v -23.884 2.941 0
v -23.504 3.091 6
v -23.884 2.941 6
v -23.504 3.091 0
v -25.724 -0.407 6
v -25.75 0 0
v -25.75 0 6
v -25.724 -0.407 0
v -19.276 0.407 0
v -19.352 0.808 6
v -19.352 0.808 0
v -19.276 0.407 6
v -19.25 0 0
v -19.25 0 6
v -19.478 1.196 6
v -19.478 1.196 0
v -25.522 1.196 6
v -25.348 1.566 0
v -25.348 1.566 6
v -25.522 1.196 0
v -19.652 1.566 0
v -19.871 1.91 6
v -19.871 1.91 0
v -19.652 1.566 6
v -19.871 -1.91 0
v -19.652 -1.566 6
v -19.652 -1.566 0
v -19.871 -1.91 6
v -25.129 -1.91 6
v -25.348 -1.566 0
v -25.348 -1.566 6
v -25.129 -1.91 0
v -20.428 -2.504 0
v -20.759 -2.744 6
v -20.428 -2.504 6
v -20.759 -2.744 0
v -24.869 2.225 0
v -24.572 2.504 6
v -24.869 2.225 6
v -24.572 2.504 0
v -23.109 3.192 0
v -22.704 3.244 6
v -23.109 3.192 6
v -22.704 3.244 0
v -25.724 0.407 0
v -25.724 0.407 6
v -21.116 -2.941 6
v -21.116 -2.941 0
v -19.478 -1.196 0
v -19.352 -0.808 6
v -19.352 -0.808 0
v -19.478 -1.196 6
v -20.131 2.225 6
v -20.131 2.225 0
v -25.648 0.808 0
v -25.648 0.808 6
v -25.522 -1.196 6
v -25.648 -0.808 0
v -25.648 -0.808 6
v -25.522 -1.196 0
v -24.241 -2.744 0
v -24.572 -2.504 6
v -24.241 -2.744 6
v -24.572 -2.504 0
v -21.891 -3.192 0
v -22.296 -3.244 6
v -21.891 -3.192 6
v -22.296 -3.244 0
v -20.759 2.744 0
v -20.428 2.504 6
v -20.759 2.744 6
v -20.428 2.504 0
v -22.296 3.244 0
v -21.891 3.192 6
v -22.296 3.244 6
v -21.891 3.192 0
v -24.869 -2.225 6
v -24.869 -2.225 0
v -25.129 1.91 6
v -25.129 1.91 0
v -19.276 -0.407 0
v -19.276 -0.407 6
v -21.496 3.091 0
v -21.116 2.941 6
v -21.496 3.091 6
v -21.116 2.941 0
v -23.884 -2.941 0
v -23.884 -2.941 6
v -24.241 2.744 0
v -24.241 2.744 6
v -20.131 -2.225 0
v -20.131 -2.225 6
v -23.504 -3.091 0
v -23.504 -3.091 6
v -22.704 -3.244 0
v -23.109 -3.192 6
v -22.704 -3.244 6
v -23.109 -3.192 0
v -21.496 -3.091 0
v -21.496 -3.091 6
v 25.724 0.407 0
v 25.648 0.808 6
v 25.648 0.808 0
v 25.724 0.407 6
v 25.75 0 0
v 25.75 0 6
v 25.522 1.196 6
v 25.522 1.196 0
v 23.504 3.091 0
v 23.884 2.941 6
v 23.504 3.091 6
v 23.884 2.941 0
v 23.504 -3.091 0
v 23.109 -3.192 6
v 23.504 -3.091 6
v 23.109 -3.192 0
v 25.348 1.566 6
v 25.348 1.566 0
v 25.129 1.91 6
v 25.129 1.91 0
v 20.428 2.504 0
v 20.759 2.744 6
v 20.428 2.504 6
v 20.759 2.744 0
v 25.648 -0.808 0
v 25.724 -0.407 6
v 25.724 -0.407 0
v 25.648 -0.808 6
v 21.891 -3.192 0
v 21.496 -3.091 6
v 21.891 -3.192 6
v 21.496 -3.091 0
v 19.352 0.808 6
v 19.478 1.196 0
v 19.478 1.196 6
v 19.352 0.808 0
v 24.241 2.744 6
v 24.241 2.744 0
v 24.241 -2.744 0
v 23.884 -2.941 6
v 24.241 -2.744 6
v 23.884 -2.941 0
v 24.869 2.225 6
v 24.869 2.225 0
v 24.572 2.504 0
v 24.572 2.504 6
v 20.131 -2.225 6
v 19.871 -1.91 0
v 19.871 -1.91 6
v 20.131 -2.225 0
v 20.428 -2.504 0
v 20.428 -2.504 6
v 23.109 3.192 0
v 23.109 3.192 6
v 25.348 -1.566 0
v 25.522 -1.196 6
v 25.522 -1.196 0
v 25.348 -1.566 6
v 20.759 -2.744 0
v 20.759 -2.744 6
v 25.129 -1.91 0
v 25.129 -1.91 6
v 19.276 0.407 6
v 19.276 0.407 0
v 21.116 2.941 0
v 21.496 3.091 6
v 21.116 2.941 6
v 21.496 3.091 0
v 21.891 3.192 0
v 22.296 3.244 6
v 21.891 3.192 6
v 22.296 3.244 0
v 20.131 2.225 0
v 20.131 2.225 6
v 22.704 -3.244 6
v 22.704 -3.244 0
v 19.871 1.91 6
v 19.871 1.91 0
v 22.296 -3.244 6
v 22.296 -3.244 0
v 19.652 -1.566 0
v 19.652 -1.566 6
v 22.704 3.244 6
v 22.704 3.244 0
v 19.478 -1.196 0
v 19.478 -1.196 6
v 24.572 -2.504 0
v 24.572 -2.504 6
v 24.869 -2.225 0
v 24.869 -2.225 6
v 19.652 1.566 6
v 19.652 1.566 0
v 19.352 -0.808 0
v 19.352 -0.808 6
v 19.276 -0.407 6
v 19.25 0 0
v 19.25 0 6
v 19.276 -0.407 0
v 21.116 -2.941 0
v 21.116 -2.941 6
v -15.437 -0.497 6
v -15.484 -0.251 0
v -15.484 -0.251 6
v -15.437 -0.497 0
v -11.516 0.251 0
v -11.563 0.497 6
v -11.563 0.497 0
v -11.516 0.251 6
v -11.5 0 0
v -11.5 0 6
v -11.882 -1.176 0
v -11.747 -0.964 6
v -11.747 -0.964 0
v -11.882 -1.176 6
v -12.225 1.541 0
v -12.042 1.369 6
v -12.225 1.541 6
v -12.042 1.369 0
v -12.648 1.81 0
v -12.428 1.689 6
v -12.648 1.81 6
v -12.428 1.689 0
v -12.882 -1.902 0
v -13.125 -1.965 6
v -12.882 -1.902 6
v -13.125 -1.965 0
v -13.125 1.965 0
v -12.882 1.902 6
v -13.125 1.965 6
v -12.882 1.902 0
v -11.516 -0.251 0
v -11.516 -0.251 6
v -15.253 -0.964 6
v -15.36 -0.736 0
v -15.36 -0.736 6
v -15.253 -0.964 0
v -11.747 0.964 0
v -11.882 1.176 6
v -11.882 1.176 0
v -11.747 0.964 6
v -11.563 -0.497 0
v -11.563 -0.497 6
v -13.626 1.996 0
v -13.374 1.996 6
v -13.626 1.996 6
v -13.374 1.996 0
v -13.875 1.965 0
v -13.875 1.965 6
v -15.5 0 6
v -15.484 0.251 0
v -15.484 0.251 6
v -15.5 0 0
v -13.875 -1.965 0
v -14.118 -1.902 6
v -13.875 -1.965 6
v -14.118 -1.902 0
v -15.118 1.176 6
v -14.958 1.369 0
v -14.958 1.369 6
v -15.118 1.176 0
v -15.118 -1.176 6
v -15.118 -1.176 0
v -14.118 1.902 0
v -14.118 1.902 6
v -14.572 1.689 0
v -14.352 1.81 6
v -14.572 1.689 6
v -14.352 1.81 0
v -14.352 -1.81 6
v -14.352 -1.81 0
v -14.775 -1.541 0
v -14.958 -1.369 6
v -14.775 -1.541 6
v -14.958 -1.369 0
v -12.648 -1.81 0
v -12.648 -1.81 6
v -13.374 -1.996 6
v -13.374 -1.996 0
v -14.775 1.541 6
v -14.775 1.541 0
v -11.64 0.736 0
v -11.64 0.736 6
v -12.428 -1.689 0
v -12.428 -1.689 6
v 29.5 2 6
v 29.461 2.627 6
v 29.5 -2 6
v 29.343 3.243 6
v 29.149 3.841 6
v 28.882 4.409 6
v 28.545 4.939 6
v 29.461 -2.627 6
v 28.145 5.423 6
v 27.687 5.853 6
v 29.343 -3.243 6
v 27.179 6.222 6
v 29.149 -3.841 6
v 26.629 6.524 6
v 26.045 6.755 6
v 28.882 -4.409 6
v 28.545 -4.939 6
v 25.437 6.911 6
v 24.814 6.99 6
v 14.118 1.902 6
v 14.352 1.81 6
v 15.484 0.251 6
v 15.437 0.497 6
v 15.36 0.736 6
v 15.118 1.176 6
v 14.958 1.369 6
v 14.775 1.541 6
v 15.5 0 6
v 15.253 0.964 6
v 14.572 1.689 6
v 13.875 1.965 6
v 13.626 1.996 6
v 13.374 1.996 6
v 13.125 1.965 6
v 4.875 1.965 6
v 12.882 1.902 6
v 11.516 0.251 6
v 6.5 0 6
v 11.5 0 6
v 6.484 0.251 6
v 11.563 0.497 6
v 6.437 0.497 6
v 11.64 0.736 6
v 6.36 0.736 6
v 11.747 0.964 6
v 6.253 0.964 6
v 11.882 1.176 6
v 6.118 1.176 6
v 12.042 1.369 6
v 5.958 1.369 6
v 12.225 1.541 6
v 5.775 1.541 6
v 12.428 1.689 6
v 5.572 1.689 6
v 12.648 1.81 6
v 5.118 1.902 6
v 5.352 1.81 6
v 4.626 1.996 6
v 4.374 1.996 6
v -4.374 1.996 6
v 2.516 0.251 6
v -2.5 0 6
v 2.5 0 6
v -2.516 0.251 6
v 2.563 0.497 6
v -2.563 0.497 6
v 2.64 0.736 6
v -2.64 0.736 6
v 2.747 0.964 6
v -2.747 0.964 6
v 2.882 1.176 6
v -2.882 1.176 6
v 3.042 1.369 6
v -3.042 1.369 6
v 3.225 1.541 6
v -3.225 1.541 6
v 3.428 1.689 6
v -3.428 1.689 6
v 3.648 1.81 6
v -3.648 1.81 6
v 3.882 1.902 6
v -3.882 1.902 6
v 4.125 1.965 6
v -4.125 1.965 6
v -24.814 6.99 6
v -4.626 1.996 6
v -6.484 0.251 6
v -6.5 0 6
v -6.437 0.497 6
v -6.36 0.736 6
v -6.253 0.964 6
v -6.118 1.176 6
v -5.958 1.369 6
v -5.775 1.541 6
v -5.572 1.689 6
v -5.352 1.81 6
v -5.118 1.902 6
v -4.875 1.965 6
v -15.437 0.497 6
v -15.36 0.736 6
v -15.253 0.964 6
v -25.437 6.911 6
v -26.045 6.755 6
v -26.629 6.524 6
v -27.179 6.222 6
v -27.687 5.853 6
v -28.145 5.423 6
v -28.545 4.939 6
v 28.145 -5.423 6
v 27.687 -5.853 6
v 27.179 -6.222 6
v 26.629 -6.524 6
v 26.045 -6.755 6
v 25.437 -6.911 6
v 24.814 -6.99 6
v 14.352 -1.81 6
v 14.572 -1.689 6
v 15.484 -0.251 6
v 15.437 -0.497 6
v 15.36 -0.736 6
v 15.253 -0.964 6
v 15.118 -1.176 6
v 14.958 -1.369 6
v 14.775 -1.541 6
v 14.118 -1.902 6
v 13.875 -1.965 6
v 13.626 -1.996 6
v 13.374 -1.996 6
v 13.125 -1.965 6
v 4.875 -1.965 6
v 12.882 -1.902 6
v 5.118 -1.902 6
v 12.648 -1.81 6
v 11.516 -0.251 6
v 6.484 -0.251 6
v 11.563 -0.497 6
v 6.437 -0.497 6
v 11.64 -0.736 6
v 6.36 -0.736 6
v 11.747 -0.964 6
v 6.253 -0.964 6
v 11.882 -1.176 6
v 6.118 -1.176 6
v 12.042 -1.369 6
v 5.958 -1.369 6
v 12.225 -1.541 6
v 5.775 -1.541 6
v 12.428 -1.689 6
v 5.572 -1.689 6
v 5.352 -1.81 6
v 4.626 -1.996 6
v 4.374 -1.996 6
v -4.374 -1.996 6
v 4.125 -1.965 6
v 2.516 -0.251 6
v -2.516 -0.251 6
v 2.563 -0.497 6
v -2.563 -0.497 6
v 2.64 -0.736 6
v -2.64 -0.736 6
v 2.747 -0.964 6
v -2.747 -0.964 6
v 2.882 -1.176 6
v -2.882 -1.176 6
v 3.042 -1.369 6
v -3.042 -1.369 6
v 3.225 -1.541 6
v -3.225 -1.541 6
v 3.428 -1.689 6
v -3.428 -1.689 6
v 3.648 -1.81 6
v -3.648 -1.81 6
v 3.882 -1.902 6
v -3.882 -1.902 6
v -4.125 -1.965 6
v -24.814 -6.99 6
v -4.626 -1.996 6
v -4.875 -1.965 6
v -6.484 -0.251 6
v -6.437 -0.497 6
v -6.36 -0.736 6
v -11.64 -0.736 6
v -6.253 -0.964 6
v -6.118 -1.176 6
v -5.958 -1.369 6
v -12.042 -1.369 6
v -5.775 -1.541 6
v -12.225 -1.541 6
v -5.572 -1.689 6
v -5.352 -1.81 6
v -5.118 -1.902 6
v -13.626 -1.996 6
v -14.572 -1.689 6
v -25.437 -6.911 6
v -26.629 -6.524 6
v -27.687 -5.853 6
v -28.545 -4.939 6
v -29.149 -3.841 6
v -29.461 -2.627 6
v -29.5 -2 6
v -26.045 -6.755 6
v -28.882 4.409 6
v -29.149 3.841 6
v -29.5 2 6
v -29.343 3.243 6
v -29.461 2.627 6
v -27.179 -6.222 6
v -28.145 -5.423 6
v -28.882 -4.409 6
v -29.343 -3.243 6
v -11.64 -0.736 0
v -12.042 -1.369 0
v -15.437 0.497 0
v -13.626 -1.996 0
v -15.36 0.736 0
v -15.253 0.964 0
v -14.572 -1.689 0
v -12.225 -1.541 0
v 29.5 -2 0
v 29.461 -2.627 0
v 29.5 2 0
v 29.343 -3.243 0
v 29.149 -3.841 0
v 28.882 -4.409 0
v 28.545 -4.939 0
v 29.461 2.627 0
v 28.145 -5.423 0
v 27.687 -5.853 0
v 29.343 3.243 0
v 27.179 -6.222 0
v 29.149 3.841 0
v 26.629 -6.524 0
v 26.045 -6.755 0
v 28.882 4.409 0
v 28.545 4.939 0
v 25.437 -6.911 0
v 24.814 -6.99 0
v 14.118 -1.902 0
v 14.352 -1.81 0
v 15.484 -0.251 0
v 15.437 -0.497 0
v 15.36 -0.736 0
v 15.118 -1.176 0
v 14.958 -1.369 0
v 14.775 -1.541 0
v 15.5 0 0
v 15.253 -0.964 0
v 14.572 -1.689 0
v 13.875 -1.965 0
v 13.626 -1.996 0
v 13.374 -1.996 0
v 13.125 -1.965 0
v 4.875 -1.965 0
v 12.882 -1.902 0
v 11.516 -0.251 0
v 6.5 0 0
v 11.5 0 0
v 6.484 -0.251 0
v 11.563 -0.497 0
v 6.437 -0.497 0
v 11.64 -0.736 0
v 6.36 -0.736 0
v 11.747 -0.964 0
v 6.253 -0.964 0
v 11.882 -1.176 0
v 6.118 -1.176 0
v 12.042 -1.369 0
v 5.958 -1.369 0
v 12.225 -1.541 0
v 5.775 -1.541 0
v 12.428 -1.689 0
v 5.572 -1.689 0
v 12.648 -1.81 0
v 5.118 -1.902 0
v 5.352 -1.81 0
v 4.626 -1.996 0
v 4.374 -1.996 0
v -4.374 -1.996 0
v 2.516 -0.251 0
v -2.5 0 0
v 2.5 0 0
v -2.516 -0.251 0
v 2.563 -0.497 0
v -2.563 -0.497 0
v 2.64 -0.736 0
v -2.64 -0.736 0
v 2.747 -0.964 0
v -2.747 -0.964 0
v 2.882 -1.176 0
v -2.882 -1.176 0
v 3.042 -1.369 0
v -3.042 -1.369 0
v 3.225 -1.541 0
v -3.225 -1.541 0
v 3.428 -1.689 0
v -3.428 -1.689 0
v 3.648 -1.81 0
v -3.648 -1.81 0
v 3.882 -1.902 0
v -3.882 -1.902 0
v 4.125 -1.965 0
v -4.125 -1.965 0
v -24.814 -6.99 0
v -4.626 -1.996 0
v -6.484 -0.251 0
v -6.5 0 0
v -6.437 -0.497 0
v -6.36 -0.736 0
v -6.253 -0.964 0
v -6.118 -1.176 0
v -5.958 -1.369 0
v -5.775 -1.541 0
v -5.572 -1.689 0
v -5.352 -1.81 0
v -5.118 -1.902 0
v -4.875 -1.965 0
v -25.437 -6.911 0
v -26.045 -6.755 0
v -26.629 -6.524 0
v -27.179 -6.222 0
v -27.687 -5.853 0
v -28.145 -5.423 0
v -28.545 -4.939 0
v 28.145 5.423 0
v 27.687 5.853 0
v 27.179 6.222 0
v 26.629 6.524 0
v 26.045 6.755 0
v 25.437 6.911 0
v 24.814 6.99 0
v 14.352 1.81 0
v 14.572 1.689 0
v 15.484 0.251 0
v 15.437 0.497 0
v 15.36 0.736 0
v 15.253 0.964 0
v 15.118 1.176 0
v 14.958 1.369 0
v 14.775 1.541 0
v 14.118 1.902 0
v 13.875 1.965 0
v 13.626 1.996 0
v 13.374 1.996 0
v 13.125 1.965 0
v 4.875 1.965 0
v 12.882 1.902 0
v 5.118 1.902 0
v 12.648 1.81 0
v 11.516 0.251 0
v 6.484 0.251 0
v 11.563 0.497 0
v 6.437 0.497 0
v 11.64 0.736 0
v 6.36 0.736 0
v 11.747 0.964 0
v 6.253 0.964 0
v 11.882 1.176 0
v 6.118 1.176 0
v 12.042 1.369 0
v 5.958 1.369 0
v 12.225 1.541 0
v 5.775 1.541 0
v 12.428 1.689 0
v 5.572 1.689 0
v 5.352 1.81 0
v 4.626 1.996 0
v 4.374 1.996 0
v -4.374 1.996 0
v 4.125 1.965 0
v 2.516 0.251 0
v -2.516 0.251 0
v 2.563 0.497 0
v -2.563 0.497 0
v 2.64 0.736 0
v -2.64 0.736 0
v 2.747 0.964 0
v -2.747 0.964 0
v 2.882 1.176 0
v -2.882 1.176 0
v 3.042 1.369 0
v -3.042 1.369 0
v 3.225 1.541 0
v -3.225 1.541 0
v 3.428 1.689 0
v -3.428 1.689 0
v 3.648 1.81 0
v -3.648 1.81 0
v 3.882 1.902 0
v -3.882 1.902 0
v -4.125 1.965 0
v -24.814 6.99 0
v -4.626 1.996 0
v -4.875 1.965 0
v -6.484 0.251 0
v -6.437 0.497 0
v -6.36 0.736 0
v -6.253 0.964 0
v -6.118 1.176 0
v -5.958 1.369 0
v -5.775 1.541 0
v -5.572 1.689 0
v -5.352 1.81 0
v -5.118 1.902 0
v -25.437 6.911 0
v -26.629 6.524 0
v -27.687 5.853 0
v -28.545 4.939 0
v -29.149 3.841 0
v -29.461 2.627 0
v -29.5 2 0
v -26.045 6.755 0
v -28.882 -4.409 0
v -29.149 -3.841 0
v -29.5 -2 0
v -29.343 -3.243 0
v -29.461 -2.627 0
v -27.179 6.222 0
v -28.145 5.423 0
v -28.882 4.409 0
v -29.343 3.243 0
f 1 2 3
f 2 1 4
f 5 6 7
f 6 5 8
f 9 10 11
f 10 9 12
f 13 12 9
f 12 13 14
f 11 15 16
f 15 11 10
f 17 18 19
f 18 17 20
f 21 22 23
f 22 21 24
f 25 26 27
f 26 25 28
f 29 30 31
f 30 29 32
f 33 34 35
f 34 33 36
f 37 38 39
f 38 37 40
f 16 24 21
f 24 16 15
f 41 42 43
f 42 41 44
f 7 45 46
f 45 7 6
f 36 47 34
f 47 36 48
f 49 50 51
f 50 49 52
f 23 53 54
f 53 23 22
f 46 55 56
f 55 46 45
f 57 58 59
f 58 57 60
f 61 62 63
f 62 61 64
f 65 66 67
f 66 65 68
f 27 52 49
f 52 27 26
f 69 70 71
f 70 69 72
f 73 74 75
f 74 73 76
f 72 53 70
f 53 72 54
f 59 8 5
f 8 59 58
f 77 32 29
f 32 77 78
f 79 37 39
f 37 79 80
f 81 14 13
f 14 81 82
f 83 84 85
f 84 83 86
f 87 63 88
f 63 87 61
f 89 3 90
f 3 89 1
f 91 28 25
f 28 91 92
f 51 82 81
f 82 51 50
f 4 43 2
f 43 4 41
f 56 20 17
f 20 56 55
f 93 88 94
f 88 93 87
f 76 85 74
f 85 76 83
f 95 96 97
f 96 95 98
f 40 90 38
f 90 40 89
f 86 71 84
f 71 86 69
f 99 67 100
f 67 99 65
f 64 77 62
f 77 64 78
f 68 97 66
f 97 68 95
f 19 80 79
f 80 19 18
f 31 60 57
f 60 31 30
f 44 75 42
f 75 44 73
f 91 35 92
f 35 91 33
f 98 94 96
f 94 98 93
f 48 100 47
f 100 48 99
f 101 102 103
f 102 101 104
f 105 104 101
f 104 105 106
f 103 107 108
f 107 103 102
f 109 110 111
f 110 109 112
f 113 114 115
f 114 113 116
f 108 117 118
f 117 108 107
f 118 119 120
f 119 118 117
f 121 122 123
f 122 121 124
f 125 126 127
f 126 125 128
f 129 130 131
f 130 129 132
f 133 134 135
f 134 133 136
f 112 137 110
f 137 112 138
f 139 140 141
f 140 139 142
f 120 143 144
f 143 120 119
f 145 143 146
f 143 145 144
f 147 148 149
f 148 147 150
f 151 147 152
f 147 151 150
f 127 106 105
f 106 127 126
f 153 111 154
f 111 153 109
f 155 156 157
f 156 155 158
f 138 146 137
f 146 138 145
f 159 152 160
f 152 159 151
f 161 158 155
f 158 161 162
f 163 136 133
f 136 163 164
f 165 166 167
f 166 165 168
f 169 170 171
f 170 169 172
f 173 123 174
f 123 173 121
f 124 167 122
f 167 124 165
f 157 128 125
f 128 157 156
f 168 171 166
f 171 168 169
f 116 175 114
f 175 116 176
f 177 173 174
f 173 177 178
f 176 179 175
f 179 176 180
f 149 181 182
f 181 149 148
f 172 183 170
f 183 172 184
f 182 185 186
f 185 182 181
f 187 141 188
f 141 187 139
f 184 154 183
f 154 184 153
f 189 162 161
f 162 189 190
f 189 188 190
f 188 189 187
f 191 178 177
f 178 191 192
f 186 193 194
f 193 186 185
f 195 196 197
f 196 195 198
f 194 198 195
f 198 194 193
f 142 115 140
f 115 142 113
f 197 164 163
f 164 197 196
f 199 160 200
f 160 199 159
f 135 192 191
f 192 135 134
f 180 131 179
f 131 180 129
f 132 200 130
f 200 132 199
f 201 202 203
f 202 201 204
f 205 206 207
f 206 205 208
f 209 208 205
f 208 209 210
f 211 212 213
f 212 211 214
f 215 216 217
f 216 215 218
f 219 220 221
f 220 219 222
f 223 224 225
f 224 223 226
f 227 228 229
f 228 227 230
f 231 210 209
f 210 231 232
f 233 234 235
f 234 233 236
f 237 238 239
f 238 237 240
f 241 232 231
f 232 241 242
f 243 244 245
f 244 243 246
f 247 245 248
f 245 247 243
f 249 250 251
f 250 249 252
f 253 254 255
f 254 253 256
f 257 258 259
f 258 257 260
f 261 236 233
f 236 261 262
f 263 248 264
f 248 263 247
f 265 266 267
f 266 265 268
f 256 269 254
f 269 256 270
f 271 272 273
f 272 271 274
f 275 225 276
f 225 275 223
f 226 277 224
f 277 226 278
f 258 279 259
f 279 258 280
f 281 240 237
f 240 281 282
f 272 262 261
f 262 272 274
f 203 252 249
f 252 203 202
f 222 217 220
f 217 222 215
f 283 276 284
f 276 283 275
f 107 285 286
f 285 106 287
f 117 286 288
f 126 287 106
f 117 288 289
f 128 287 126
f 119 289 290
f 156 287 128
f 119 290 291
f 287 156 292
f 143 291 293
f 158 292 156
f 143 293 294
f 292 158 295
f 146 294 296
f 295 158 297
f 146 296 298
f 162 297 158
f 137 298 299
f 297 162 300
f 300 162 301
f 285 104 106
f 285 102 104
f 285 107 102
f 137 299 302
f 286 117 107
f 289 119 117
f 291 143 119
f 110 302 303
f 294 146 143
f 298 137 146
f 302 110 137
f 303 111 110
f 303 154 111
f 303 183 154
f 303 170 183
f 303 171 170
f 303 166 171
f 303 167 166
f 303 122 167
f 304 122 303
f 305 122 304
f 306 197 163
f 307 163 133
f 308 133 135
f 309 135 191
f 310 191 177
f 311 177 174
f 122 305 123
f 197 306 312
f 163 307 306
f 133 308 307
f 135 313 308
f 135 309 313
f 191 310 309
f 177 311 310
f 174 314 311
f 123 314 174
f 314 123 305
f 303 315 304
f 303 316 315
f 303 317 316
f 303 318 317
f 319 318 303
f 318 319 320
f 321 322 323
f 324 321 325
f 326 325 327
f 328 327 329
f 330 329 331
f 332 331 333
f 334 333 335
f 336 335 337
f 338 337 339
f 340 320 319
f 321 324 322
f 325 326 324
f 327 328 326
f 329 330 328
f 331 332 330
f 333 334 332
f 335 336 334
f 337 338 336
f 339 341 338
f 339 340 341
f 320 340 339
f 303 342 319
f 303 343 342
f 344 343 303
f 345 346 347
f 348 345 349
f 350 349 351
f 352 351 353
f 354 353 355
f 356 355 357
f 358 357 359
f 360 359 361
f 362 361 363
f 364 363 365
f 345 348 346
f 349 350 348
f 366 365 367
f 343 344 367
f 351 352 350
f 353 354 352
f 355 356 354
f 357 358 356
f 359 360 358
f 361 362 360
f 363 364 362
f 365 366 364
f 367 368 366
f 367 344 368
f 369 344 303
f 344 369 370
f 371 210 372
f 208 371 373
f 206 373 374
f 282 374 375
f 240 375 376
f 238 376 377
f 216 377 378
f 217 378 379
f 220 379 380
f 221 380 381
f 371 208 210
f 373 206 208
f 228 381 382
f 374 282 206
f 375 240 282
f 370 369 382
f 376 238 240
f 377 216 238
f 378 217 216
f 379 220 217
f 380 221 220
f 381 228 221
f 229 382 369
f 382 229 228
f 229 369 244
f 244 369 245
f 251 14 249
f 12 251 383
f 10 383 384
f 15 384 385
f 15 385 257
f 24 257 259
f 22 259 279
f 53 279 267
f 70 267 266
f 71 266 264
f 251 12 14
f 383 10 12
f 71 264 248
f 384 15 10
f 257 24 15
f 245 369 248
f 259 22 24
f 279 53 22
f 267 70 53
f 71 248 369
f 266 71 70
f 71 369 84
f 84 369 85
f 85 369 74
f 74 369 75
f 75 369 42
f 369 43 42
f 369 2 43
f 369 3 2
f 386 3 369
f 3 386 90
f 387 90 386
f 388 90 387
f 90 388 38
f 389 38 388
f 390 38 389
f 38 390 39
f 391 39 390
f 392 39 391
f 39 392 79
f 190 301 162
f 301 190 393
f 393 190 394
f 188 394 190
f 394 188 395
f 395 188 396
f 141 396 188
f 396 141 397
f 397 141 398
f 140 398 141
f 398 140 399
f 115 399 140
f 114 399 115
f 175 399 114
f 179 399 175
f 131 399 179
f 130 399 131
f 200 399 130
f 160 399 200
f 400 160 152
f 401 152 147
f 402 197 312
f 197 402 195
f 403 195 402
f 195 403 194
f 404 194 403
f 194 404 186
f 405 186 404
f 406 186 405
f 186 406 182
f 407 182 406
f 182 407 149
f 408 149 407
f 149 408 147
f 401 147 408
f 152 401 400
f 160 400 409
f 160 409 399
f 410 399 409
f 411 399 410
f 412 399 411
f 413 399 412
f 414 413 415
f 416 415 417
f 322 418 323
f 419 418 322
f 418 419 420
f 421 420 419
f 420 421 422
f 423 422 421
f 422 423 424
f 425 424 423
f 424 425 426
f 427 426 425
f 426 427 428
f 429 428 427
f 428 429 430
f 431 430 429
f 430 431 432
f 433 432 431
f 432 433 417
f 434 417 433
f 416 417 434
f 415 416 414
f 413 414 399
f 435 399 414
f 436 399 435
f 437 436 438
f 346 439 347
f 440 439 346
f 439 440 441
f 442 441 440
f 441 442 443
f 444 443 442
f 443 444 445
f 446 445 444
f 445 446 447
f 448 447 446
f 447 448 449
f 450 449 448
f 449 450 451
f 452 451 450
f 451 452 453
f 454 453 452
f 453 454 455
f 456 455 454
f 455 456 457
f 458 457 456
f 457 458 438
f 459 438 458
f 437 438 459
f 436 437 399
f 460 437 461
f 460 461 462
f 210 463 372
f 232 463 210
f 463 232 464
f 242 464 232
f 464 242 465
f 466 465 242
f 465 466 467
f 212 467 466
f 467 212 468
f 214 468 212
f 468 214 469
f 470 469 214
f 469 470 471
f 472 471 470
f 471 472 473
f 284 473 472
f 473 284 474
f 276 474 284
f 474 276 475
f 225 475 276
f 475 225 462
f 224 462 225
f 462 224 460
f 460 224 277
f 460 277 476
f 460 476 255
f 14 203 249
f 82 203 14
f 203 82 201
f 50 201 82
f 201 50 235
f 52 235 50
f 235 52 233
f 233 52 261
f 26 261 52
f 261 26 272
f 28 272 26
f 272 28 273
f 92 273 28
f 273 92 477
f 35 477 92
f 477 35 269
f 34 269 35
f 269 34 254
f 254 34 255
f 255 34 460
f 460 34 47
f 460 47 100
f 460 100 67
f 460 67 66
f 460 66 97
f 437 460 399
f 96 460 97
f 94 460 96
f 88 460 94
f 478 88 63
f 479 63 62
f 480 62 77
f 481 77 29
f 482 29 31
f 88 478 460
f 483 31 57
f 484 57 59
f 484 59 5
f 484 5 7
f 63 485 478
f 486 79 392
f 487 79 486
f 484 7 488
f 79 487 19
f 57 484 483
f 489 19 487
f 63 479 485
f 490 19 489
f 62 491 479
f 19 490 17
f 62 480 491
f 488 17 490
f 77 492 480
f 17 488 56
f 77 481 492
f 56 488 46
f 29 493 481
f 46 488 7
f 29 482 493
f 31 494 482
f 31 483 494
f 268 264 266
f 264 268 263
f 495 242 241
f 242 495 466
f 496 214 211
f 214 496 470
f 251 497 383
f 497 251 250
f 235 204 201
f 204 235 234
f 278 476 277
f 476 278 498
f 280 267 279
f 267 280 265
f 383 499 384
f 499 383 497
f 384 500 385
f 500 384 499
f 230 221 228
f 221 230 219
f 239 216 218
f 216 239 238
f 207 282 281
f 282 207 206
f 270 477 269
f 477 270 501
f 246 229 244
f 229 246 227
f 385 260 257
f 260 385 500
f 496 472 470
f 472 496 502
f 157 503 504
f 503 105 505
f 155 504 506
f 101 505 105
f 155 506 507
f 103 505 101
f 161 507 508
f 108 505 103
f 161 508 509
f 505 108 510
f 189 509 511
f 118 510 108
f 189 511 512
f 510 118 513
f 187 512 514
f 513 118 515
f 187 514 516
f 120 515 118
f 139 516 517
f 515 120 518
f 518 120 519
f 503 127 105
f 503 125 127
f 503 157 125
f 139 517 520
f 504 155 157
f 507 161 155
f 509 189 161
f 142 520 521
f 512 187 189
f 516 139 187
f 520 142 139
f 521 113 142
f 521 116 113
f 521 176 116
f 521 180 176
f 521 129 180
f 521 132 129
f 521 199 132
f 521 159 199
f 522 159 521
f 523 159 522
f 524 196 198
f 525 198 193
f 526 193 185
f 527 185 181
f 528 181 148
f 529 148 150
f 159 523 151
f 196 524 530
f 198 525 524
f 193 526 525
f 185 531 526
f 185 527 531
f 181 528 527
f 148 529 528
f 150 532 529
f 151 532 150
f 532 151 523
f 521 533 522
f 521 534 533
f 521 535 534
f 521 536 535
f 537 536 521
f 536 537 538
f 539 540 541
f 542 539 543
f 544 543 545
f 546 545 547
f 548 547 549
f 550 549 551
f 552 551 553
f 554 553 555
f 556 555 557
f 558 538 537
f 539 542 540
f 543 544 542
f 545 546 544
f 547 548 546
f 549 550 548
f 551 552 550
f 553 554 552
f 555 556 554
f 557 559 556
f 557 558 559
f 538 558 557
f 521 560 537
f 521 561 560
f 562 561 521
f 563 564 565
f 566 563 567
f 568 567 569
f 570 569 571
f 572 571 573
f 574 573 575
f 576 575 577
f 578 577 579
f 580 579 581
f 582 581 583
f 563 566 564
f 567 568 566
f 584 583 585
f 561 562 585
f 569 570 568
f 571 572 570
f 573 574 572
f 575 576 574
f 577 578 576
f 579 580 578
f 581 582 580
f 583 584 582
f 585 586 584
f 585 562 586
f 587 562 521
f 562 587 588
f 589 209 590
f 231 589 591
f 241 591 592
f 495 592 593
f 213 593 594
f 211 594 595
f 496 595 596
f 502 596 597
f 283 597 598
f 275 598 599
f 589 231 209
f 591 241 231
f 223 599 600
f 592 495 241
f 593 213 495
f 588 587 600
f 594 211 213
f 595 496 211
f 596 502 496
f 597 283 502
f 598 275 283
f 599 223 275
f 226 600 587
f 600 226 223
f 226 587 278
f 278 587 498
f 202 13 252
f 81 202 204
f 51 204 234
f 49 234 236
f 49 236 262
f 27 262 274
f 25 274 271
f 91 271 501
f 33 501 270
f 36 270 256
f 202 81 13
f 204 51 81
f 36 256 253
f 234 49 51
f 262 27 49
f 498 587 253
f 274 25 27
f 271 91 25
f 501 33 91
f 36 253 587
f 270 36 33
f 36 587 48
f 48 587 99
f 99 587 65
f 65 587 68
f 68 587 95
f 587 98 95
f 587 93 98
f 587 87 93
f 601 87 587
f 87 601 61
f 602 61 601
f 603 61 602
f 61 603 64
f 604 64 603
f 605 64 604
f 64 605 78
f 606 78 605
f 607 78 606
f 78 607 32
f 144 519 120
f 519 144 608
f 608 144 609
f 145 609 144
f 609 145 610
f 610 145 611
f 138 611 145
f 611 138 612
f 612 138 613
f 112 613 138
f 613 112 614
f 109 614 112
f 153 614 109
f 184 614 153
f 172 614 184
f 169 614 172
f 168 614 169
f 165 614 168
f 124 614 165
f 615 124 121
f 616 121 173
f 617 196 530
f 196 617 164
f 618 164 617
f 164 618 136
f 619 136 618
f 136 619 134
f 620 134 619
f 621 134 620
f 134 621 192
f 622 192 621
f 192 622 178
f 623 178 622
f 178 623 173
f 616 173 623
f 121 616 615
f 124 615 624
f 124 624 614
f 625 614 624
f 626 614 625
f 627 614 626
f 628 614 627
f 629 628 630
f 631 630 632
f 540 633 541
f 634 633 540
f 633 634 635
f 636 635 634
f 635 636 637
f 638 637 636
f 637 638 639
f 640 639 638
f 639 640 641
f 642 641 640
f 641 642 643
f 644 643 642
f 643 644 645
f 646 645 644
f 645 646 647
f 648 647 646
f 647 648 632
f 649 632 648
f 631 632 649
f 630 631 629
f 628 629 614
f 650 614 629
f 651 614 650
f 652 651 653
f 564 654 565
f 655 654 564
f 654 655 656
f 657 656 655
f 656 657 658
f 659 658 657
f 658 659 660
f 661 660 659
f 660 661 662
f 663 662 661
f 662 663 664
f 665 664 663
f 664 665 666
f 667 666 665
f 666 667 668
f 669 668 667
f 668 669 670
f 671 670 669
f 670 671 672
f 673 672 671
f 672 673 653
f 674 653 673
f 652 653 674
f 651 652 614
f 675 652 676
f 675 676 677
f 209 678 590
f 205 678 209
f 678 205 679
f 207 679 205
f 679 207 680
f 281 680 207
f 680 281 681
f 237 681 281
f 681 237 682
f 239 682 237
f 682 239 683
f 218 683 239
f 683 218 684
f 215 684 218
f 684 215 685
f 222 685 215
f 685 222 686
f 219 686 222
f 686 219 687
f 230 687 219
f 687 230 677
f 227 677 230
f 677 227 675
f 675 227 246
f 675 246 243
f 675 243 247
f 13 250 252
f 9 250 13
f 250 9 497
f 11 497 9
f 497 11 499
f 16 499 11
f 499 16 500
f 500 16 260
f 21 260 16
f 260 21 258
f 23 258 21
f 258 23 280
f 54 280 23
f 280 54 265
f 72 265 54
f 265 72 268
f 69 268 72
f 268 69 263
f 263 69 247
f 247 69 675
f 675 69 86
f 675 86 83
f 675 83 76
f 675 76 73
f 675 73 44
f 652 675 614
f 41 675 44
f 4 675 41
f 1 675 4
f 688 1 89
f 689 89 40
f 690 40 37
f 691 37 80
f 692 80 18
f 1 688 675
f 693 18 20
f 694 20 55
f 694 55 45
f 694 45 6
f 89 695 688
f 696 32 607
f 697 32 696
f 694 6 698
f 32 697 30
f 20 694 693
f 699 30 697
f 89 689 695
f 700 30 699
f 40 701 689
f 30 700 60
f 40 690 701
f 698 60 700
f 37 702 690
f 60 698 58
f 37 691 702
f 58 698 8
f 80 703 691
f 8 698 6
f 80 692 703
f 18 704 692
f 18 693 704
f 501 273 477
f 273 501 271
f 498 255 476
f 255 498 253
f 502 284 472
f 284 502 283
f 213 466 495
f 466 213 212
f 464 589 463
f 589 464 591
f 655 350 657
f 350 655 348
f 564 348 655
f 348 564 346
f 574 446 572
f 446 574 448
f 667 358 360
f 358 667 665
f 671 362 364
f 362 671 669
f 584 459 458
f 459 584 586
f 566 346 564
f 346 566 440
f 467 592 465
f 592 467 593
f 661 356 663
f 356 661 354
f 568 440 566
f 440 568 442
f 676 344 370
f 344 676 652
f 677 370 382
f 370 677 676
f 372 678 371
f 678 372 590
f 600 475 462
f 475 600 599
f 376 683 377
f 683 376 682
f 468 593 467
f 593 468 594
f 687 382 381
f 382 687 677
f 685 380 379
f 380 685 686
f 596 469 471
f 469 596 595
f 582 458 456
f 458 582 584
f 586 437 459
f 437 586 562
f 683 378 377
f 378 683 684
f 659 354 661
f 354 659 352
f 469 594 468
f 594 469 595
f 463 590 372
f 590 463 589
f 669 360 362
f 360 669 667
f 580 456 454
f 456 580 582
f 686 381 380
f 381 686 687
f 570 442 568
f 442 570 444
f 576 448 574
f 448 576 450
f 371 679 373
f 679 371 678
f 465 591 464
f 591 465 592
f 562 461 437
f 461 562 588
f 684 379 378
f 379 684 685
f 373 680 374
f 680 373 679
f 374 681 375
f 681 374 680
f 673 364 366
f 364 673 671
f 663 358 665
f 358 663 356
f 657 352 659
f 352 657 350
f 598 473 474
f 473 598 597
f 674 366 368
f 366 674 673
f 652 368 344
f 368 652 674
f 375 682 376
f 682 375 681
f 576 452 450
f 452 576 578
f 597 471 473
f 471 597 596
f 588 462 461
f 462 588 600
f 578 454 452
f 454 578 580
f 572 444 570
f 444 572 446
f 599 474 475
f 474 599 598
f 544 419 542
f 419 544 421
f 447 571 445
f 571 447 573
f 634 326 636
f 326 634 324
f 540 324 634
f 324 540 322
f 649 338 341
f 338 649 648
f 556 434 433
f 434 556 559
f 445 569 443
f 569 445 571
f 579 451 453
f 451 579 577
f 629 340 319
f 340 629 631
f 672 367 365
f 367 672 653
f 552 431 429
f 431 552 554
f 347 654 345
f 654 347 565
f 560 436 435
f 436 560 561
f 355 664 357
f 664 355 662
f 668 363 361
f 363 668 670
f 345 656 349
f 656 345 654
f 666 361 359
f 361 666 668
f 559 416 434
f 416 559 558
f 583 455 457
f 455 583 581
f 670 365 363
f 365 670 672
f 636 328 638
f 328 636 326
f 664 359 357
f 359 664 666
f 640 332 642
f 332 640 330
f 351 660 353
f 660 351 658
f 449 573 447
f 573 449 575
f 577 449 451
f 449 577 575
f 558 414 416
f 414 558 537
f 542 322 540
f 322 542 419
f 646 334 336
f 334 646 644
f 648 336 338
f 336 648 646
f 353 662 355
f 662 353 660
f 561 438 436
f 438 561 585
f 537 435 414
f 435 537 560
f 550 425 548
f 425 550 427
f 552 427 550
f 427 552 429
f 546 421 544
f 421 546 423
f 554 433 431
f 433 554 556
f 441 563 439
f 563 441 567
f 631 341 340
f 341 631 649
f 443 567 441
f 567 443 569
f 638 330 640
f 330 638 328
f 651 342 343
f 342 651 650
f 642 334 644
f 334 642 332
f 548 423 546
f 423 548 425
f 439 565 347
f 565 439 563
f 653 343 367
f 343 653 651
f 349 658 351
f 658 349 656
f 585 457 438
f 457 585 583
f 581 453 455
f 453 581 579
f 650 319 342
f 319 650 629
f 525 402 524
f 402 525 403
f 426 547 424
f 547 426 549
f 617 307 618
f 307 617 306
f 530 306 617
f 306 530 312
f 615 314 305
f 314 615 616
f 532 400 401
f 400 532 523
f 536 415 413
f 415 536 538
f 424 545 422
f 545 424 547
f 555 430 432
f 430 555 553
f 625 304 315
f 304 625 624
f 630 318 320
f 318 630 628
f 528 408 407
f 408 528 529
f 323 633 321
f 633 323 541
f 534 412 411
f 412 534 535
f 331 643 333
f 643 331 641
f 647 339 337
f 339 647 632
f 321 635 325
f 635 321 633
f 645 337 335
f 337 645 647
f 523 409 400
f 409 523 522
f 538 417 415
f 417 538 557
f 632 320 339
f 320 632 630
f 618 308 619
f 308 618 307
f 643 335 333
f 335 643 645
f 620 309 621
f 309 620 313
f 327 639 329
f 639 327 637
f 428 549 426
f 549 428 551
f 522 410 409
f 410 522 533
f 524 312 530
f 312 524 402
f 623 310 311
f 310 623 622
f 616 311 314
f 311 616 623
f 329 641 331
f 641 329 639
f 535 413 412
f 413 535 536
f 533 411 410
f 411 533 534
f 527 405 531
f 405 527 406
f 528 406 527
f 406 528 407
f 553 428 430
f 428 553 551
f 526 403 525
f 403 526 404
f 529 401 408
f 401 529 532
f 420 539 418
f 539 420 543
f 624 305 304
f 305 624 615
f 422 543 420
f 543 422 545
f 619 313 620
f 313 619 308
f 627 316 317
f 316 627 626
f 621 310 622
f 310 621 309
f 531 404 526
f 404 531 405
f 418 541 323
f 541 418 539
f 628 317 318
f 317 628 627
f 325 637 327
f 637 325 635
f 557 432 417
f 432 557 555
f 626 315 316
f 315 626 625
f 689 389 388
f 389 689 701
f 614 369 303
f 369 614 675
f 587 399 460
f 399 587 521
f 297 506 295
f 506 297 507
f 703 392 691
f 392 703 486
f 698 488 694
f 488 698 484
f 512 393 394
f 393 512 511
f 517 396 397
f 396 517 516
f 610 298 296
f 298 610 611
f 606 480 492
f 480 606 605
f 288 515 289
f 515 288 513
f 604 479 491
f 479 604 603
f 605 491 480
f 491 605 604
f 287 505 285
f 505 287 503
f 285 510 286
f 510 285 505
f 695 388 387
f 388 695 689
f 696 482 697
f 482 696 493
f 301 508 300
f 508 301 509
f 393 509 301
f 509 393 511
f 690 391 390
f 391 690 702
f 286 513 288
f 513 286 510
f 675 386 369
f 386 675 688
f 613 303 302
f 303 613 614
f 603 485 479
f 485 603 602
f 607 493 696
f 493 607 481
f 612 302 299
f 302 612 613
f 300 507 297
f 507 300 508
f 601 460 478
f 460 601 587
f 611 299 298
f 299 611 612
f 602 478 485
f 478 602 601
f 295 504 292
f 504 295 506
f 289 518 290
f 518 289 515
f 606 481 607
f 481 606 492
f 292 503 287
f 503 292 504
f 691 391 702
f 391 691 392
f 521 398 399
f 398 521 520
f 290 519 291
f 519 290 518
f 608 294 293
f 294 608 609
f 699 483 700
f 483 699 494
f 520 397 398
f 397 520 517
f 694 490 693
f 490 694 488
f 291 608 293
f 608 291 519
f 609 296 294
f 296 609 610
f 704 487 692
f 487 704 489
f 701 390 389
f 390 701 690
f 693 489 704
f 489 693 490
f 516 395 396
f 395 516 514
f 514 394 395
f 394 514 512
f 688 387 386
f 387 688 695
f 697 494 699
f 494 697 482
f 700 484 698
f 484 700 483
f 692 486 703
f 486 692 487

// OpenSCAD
$fn = 50;


difference() {
	union() {
		hull() {
			translate(v = [-24.5000000000, 2.0000000000, 0]) {
				cylinder(h = 6, r = 5);
			}
			translate(v = [24.5000000000, 2.0000000000, 0]) {
				cylinder(h = 6, r = 5);
			}
			translate(v = [-24.5000000000, -2.0000000000, 0]) {
				cylinder(h = 6, r = 5);
			}
			translate(v = [24.5000000000, -2.0000000000, 0]) {
				cylinder(h = 6, r = 5);
			}
		}
	}
	union() {
		#translate(v = [-22.5000000000, 0.0000000000, 0]) {
			cylinder(h = 6, r = 3.2500000000);
		}
		#translate(v = [22.5000000000, 0.0000000000, 0]) {
			cylinder(h = 6, r = 3.2500000000);
		}
		#translate(v = [-22.5000000000, 0.0000000000, -100.0000000000]) {
			cylinder(h = 200, r = 3.2500000000);
		}
		#translate(v = [-22.5000000000, 0.0000000000, -100.0000000000]) {
			cylinder(h = 200, r = 3.2500000000);
		}
		#translate(v = [22.5000000000, 0.0000000000, -100.0000000000]) {
			cylinder(h = 200, r = 3.2500000000);
		}
		#translate(v = [22.5000000000, 0.0000000000, -100.0000000000]) {
			cylinder(h = 200, r = 3.2500000000);
		}
		#translate(v = [-22.5000000000, 0.0000000000, 0]) {
			cylinder(h = 6, r = 1.8000000000);
		}
		#translate(v = [22.5000000000, 0.0000000000, 0]) {
			cylinder(h = 6, r = 1.8000000000);
		}
		#translate(v = [-22.5000000000, 0.0000000000, 0]) {
			cylinder(h = 6, r = 1.8000000000);
		}
		#translate(v = [22.5000000000, 0.0000000000, 0]) {
			cylinder(h = 6, r = 1.8000000000);
		}
		#translate(v = [-22.5000000000, 0.0000000000, 0]) {
			cylinder(h = 6, r = 1.8000000000);
		}
		#translate(v = [22.5000000000, 0.0000000000, 0]) {
			cylinder(h = 6, r = 1.8000000000);
		}
		#translate(v = [-13.5000000000, 0, 0]) {
			cylinder(h = 6, r = 2.0000000000);
		}
		#translate(v = [-4.5000000000, 0, 0]) {
			cylinder(h = 6, r = 2.0000000000);
		}
		#translate(v = [4.5000000000, 0, 0]) {
			cylinder(h = 6, r = 2.0000000000);
		}
		#translate(v = [13.5000000000, 0, 0]) {
			cylinder(h = 6, r = 2.0000000000);
		}
	}
}
